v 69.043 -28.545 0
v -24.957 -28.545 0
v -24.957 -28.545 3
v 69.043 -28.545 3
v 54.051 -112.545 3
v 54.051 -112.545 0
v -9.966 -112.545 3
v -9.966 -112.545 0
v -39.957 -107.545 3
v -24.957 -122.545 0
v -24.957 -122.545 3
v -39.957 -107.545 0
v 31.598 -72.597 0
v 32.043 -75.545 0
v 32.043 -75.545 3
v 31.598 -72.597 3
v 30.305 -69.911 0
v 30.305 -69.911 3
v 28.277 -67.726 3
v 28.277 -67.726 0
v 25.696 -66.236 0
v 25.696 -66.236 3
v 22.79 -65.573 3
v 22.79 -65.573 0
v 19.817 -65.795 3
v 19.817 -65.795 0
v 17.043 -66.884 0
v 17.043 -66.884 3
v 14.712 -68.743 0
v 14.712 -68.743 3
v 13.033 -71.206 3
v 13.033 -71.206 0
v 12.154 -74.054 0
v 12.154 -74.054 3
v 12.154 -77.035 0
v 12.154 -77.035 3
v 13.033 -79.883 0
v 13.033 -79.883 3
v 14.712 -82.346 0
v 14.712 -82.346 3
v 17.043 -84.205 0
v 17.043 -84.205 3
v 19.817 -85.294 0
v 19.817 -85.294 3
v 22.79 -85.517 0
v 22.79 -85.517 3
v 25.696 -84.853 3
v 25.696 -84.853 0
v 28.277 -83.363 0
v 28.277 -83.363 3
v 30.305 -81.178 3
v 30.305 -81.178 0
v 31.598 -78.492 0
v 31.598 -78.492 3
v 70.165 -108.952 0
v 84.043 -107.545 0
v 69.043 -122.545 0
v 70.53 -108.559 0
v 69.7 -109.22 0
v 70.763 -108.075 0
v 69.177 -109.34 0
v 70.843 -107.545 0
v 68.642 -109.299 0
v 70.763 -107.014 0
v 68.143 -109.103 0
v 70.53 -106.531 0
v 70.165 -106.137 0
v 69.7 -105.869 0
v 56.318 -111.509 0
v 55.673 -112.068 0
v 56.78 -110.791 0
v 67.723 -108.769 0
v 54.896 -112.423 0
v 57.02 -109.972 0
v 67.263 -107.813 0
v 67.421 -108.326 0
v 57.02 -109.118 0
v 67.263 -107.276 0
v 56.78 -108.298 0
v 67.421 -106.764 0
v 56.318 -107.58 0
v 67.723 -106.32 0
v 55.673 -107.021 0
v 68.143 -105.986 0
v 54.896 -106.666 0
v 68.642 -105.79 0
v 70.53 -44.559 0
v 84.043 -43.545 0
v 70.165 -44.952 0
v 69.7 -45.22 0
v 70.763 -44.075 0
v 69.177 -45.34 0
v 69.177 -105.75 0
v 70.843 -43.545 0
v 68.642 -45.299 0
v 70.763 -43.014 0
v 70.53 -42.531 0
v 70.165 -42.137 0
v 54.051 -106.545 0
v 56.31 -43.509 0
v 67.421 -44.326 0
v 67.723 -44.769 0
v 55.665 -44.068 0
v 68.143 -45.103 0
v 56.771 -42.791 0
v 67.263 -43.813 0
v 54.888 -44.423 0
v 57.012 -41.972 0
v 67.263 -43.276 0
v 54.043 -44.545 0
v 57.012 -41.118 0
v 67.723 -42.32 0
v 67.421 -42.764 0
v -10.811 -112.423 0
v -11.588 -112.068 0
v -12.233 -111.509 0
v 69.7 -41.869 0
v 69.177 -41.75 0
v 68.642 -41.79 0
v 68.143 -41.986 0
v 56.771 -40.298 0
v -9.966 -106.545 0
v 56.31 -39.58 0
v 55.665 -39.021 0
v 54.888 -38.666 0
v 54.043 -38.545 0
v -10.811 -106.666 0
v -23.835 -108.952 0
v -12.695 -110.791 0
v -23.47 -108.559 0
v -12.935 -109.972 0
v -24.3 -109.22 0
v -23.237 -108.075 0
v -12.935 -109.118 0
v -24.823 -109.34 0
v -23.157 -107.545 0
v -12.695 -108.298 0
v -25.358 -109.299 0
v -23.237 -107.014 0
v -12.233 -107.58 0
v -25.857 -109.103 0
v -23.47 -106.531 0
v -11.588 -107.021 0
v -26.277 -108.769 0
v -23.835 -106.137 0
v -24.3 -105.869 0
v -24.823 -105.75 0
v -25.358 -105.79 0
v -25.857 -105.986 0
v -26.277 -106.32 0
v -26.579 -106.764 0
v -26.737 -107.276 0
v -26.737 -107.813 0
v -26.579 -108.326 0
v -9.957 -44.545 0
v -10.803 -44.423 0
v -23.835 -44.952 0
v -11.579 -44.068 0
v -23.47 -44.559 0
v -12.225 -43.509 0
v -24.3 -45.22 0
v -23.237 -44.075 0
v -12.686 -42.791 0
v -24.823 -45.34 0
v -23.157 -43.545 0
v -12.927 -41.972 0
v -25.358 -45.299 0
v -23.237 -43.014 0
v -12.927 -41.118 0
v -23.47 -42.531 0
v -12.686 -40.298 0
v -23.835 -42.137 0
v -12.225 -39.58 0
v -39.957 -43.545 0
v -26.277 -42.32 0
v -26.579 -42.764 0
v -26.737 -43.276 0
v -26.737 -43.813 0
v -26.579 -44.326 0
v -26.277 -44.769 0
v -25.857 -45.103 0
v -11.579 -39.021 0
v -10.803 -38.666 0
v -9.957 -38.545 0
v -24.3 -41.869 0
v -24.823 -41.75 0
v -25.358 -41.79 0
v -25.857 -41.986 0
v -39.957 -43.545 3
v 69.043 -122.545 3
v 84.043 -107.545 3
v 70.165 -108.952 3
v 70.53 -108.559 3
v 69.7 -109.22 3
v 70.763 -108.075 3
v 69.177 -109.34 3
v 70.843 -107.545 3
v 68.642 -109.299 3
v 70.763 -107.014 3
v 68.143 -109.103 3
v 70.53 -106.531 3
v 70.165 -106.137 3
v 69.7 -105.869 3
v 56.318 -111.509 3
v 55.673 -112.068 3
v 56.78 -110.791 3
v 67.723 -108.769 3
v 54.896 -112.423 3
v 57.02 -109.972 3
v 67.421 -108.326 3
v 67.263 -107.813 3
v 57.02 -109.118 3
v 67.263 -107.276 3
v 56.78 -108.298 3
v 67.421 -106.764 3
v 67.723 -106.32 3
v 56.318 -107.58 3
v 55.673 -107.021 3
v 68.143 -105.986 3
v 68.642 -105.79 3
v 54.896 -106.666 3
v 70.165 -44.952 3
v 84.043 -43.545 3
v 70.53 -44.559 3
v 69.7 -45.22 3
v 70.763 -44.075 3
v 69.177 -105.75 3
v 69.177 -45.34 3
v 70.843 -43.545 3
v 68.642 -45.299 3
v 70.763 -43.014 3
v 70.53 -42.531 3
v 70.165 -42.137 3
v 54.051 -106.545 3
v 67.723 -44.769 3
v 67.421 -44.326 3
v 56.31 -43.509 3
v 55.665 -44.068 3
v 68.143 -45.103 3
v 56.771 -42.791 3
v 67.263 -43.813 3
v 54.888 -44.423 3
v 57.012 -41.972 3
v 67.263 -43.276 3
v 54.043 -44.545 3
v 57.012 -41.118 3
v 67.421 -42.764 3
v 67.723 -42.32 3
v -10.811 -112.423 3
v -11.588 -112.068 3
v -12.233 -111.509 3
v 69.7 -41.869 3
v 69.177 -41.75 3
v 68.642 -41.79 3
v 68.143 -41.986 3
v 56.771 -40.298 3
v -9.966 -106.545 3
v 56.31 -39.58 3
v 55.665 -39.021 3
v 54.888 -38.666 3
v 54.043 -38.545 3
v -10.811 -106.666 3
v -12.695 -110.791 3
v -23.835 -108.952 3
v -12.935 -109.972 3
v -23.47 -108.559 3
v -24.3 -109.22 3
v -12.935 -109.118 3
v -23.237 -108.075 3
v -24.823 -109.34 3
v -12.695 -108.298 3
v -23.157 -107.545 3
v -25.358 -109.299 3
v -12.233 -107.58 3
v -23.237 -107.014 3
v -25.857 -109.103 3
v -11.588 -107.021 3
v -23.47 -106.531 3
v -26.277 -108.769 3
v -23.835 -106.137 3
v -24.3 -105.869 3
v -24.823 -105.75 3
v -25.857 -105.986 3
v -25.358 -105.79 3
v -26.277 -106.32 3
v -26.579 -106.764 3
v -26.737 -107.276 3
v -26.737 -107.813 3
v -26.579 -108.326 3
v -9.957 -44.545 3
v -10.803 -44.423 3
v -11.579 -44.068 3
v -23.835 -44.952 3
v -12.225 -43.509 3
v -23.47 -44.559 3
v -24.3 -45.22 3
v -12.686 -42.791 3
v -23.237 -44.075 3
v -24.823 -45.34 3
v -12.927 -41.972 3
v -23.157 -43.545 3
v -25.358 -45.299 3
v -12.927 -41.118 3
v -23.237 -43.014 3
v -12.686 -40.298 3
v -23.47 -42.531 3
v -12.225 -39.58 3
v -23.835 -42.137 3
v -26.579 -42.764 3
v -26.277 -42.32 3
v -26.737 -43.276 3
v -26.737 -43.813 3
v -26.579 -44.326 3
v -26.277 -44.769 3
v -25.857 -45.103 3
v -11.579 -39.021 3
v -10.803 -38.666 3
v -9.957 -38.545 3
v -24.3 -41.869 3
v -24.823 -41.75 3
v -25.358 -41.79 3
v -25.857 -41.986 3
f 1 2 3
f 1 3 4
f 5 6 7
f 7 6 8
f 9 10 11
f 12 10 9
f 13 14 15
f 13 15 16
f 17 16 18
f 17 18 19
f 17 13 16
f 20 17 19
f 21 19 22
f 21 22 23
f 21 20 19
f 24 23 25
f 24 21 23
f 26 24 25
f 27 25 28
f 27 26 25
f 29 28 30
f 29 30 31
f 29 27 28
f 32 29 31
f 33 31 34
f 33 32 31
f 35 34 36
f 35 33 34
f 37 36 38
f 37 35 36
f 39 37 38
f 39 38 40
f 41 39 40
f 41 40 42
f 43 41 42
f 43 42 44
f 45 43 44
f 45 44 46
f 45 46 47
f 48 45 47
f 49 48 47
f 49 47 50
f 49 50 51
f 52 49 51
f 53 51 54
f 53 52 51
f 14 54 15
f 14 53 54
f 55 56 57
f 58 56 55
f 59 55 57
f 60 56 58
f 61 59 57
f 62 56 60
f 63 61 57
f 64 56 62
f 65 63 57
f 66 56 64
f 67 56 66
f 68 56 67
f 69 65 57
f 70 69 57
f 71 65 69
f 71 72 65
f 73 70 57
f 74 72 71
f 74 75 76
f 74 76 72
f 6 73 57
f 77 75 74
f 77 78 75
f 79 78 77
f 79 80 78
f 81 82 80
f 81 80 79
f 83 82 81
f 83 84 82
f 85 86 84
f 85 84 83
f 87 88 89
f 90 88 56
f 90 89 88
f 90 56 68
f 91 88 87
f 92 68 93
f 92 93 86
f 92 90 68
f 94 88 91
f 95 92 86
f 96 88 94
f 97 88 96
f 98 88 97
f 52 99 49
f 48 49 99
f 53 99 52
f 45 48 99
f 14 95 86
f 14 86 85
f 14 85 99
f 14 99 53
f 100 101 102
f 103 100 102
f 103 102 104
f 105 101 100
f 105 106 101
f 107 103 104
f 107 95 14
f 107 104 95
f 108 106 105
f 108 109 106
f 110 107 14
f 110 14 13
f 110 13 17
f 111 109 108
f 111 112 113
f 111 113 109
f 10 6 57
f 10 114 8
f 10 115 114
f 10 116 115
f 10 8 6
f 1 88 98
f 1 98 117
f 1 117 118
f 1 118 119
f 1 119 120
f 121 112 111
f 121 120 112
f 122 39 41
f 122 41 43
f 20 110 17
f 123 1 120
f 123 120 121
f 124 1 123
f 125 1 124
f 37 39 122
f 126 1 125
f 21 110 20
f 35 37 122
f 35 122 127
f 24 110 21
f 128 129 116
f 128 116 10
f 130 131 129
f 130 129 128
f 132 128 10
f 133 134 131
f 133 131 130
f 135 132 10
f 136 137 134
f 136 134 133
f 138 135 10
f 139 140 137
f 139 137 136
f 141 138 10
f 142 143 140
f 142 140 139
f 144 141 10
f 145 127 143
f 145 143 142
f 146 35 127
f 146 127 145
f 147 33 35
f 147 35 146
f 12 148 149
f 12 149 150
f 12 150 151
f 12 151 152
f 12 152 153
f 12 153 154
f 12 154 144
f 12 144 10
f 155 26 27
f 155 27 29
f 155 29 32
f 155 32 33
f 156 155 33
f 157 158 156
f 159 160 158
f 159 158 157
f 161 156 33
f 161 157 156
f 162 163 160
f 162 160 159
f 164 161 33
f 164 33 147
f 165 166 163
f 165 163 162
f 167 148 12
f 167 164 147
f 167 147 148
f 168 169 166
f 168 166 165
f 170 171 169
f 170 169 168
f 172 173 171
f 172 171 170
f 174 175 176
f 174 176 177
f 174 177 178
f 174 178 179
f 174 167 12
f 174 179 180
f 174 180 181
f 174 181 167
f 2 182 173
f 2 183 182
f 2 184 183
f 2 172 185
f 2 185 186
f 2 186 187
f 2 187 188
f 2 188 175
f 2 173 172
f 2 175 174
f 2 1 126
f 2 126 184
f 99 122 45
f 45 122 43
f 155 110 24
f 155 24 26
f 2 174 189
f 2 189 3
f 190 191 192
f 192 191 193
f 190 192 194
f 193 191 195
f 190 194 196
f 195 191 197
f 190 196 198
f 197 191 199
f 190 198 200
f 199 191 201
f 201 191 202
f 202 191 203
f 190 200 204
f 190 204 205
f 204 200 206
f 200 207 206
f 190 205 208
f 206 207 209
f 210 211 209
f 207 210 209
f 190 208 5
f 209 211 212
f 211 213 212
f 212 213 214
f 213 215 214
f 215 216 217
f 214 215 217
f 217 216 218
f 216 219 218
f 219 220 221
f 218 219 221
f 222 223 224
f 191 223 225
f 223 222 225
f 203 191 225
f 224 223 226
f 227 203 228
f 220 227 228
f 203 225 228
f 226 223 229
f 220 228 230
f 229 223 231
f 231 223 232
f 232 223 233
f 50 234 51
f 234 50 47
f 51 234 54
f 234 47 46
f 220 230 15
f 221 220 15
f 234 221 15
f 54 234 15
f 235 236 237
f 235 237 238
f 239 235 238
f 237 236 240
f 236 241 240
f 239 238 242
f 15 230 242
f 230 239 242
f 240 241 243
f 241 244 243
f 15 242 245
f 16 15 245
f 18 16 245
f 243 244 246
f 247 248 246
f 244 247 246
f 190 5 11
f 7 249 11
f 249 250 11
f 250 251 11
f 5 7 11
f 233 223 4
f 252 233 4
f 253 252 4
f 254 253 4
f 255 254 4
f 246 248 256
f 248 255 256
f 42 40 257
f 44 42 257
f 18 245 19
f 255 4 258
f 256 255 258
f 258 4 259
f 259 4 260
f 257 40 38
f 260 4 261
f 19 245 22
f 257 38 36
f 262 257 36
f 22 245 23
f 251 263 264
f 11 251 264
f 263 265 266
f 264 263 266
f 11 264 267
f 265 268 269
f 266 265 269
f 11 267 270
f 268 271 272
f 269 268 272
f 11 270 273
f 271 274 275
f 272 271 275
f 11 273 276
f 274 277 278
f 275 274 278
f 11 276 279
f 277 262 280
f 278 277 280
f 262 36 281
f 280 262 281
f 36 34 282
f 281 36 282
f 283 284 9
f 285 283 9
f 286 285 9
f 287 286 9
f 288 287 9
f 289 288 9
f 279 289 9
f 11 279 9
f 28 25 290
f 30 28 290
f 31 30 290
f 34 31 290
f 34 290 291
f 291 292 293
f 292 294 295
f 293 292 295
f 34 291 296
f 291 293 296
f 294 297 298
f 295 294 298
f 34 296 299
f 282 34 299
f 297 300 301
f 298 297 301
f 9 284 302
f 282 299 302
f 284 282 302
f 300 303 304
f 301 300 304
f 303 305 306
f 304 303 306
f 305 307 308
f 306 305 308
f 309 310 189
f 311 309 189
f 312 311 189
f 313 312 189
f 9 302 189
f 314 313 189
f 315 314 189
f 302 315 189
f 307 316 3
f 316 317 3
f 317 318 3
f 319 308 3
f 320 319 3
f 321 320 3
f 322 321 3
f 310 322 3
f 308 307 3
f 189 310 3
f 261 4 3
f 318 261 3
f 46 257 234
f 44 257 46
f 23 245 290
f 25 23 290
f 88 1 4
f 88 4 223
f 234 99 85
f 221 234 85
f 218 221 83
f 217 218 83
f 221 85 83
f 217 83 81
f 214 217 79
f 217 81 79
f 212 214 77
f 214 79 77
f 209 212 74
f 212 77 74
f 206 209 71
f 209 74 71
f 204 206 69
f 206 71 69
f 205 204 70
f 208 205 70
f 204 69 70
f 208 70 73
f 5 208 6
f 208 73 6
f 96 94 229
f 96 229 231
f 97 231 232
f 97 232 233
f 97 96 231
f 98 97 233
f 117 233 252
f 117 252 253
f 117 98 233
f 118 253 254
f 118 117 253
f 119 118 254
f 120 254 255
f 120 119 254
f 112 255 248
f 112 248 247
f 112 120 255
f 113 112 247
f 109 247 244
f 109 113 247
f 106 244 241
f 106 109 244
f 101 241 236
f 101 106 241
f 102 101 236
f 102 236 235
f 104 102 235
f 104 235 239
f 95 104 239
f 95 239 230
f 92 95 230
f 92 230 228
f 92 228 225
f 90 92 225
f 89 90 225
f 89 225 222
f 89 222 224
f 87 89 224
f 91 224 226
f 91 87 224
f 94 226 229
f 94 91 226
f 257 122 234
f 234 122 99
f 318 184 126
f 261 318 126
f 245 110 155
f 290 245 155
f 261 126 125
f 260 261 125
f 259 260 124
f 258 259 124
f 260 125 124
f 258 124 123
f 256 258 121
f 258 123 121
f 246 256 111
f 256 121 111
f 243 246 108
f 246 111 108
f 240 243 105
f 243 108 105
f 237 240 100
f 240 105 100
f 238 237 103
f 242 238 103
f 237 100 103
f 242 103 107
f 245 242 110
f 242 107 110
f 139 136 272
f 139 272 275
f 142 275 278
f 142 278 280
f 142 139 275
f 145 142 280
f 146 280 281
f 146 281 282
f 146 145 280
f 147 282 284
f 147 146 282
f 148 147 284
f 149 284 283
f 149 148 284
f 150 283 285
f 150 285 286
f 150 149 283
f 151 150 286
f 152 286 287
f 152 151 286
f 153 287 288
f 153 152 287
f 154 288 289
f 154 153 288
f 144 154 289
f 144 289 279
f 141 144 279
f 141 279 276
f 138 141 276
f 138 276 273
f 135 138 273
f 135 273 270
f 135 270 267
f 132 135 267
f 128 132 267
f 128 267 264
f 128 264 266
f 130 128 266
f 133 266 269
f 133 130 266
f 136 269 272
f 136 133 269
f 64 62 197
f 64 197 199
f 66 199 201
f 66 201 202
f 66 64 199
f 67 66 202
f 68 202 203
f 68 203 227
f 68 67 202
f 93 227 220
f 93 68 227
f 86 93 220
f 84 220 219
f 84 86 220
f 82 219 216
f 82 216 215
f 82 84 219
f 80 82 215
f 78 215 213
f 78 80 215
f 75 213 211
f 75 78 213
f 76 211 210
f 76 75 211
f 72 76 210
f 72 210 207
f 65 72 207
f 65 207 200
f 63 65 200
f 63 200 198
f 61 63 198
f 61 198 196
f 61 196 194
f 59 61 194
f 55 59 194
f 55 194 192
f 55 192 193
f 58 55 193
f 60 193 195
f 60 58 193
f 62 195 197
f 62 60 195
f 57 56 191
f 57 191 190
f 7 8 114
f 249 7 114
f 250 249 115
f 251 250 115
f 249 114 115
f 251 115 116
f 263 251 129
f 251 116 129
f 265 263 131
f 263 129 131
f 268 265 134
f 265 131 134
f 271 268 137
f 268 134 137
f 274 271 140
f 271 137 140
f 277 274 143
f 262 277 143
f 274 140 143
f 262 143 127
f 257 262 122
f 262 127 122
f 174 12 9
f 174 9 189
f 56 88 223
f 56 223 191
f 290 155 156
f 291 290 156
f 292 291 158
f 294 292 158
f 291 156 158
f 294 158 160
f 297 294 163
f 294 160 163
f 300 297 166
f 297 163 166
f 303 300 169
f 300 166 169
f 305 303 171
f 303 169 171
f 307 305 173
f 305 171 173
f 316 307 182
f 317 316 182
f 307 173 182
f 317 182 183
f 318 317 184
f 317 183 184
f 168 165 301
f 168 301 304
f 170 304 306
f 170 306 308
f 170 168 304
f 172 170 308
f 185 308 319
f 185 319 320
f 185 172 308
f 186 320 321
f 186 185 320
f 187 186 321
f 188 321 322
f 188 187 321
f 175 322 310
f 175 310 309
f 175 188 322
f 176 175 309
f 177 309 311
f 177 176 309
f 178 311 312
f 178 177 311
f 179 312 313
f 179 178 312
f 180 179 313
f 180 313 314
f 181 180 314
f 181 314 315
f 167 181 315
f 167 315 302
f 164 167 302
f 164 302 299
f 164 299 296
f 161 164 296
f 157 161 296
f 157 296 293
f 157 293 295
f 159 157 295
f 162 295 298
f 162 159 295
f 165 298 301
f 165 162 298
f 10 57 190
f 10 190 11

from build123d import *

# Parameters (mm, degrees)
SKETCH1_R           = 1.8
SKETCH1_R_2         = 10
BOSS_EXTRUDE1_DEPTH = 3


with BuildPart() as part:
    # Sketch1 → Boss-Extrude1 (new body)
    with BuildSketch(Plane.XY):
        Polygon((-39.957408855, -43.544565591), (-24.957408855, -28.544565591), (69.042591145, -28.544565591), (84.042591145, -43.544565591), (84.042591145, -107.544565591), (69.042591145, -122.544565591), (-24.957408855, -122.544565591), (-39.957408855, -107.544565591), align=None)
        with Locations((-24.957408855, -43.544565591)):
            Circle(SKETCH1_R, mode=Mode.SUBTRACT)
        with Locations((69.042591145, -43.544565591)):
            Circle(SKETCH1_R, mode=Mode.SUBTRACT)
        with Locations((69.042591145, -107.544565591)):
            Circle(SKETCH1_R, mode=Mode.SUBTRACT)
        with Locations((-24.957408855, -107.544565591)):
            Circle(SKETCH1_R, mode=Mode.SUBTRACT)
        with Locations((22.042591145, -75.544565591)):
            Circle(SKETCH1_R_2, mode=Mode.SUBTRACT)
        with BuildLine():
            Line((-9.957408855, -38.544565591), (54.042591145, -38.544565591))
            ThreePointArc((54.042591145, -38.544565591), (57.042591145, -41.544565591), (54.042591145, -44.544565591))
            Line((54.042591145, -44.544565591), (-9.957408855, -44.544565591))
            ThreePointArc((-9.957408855, -44.544565591), (-12.957408855, -41.544565591), (-9.957408855, -38.544565591))
        make_face(mode=Mode.SUBTRACT)
        with BuildLine():
            Line((-9.965744505, -106.544565591), (54.050926794, -106.544565591))
            ThreePointArc((54.050926794, -106.544565591), (57.050926794, -109.544565591), (54.050926794, -112.544565591))
            Line((54.050926794, -112.544565591), (-9.965744505, -112.544565591))
            ThreePointArc((-9.965744505, -112.544565591), (-12.965744505, -109.544565591), (-9.965744505, -106.544565591))
        make_face(mode=Mode.SUBTRACT)
    extrude(amount=BOSS_EXTRUDE1_DEPTH)


solid = part.part
